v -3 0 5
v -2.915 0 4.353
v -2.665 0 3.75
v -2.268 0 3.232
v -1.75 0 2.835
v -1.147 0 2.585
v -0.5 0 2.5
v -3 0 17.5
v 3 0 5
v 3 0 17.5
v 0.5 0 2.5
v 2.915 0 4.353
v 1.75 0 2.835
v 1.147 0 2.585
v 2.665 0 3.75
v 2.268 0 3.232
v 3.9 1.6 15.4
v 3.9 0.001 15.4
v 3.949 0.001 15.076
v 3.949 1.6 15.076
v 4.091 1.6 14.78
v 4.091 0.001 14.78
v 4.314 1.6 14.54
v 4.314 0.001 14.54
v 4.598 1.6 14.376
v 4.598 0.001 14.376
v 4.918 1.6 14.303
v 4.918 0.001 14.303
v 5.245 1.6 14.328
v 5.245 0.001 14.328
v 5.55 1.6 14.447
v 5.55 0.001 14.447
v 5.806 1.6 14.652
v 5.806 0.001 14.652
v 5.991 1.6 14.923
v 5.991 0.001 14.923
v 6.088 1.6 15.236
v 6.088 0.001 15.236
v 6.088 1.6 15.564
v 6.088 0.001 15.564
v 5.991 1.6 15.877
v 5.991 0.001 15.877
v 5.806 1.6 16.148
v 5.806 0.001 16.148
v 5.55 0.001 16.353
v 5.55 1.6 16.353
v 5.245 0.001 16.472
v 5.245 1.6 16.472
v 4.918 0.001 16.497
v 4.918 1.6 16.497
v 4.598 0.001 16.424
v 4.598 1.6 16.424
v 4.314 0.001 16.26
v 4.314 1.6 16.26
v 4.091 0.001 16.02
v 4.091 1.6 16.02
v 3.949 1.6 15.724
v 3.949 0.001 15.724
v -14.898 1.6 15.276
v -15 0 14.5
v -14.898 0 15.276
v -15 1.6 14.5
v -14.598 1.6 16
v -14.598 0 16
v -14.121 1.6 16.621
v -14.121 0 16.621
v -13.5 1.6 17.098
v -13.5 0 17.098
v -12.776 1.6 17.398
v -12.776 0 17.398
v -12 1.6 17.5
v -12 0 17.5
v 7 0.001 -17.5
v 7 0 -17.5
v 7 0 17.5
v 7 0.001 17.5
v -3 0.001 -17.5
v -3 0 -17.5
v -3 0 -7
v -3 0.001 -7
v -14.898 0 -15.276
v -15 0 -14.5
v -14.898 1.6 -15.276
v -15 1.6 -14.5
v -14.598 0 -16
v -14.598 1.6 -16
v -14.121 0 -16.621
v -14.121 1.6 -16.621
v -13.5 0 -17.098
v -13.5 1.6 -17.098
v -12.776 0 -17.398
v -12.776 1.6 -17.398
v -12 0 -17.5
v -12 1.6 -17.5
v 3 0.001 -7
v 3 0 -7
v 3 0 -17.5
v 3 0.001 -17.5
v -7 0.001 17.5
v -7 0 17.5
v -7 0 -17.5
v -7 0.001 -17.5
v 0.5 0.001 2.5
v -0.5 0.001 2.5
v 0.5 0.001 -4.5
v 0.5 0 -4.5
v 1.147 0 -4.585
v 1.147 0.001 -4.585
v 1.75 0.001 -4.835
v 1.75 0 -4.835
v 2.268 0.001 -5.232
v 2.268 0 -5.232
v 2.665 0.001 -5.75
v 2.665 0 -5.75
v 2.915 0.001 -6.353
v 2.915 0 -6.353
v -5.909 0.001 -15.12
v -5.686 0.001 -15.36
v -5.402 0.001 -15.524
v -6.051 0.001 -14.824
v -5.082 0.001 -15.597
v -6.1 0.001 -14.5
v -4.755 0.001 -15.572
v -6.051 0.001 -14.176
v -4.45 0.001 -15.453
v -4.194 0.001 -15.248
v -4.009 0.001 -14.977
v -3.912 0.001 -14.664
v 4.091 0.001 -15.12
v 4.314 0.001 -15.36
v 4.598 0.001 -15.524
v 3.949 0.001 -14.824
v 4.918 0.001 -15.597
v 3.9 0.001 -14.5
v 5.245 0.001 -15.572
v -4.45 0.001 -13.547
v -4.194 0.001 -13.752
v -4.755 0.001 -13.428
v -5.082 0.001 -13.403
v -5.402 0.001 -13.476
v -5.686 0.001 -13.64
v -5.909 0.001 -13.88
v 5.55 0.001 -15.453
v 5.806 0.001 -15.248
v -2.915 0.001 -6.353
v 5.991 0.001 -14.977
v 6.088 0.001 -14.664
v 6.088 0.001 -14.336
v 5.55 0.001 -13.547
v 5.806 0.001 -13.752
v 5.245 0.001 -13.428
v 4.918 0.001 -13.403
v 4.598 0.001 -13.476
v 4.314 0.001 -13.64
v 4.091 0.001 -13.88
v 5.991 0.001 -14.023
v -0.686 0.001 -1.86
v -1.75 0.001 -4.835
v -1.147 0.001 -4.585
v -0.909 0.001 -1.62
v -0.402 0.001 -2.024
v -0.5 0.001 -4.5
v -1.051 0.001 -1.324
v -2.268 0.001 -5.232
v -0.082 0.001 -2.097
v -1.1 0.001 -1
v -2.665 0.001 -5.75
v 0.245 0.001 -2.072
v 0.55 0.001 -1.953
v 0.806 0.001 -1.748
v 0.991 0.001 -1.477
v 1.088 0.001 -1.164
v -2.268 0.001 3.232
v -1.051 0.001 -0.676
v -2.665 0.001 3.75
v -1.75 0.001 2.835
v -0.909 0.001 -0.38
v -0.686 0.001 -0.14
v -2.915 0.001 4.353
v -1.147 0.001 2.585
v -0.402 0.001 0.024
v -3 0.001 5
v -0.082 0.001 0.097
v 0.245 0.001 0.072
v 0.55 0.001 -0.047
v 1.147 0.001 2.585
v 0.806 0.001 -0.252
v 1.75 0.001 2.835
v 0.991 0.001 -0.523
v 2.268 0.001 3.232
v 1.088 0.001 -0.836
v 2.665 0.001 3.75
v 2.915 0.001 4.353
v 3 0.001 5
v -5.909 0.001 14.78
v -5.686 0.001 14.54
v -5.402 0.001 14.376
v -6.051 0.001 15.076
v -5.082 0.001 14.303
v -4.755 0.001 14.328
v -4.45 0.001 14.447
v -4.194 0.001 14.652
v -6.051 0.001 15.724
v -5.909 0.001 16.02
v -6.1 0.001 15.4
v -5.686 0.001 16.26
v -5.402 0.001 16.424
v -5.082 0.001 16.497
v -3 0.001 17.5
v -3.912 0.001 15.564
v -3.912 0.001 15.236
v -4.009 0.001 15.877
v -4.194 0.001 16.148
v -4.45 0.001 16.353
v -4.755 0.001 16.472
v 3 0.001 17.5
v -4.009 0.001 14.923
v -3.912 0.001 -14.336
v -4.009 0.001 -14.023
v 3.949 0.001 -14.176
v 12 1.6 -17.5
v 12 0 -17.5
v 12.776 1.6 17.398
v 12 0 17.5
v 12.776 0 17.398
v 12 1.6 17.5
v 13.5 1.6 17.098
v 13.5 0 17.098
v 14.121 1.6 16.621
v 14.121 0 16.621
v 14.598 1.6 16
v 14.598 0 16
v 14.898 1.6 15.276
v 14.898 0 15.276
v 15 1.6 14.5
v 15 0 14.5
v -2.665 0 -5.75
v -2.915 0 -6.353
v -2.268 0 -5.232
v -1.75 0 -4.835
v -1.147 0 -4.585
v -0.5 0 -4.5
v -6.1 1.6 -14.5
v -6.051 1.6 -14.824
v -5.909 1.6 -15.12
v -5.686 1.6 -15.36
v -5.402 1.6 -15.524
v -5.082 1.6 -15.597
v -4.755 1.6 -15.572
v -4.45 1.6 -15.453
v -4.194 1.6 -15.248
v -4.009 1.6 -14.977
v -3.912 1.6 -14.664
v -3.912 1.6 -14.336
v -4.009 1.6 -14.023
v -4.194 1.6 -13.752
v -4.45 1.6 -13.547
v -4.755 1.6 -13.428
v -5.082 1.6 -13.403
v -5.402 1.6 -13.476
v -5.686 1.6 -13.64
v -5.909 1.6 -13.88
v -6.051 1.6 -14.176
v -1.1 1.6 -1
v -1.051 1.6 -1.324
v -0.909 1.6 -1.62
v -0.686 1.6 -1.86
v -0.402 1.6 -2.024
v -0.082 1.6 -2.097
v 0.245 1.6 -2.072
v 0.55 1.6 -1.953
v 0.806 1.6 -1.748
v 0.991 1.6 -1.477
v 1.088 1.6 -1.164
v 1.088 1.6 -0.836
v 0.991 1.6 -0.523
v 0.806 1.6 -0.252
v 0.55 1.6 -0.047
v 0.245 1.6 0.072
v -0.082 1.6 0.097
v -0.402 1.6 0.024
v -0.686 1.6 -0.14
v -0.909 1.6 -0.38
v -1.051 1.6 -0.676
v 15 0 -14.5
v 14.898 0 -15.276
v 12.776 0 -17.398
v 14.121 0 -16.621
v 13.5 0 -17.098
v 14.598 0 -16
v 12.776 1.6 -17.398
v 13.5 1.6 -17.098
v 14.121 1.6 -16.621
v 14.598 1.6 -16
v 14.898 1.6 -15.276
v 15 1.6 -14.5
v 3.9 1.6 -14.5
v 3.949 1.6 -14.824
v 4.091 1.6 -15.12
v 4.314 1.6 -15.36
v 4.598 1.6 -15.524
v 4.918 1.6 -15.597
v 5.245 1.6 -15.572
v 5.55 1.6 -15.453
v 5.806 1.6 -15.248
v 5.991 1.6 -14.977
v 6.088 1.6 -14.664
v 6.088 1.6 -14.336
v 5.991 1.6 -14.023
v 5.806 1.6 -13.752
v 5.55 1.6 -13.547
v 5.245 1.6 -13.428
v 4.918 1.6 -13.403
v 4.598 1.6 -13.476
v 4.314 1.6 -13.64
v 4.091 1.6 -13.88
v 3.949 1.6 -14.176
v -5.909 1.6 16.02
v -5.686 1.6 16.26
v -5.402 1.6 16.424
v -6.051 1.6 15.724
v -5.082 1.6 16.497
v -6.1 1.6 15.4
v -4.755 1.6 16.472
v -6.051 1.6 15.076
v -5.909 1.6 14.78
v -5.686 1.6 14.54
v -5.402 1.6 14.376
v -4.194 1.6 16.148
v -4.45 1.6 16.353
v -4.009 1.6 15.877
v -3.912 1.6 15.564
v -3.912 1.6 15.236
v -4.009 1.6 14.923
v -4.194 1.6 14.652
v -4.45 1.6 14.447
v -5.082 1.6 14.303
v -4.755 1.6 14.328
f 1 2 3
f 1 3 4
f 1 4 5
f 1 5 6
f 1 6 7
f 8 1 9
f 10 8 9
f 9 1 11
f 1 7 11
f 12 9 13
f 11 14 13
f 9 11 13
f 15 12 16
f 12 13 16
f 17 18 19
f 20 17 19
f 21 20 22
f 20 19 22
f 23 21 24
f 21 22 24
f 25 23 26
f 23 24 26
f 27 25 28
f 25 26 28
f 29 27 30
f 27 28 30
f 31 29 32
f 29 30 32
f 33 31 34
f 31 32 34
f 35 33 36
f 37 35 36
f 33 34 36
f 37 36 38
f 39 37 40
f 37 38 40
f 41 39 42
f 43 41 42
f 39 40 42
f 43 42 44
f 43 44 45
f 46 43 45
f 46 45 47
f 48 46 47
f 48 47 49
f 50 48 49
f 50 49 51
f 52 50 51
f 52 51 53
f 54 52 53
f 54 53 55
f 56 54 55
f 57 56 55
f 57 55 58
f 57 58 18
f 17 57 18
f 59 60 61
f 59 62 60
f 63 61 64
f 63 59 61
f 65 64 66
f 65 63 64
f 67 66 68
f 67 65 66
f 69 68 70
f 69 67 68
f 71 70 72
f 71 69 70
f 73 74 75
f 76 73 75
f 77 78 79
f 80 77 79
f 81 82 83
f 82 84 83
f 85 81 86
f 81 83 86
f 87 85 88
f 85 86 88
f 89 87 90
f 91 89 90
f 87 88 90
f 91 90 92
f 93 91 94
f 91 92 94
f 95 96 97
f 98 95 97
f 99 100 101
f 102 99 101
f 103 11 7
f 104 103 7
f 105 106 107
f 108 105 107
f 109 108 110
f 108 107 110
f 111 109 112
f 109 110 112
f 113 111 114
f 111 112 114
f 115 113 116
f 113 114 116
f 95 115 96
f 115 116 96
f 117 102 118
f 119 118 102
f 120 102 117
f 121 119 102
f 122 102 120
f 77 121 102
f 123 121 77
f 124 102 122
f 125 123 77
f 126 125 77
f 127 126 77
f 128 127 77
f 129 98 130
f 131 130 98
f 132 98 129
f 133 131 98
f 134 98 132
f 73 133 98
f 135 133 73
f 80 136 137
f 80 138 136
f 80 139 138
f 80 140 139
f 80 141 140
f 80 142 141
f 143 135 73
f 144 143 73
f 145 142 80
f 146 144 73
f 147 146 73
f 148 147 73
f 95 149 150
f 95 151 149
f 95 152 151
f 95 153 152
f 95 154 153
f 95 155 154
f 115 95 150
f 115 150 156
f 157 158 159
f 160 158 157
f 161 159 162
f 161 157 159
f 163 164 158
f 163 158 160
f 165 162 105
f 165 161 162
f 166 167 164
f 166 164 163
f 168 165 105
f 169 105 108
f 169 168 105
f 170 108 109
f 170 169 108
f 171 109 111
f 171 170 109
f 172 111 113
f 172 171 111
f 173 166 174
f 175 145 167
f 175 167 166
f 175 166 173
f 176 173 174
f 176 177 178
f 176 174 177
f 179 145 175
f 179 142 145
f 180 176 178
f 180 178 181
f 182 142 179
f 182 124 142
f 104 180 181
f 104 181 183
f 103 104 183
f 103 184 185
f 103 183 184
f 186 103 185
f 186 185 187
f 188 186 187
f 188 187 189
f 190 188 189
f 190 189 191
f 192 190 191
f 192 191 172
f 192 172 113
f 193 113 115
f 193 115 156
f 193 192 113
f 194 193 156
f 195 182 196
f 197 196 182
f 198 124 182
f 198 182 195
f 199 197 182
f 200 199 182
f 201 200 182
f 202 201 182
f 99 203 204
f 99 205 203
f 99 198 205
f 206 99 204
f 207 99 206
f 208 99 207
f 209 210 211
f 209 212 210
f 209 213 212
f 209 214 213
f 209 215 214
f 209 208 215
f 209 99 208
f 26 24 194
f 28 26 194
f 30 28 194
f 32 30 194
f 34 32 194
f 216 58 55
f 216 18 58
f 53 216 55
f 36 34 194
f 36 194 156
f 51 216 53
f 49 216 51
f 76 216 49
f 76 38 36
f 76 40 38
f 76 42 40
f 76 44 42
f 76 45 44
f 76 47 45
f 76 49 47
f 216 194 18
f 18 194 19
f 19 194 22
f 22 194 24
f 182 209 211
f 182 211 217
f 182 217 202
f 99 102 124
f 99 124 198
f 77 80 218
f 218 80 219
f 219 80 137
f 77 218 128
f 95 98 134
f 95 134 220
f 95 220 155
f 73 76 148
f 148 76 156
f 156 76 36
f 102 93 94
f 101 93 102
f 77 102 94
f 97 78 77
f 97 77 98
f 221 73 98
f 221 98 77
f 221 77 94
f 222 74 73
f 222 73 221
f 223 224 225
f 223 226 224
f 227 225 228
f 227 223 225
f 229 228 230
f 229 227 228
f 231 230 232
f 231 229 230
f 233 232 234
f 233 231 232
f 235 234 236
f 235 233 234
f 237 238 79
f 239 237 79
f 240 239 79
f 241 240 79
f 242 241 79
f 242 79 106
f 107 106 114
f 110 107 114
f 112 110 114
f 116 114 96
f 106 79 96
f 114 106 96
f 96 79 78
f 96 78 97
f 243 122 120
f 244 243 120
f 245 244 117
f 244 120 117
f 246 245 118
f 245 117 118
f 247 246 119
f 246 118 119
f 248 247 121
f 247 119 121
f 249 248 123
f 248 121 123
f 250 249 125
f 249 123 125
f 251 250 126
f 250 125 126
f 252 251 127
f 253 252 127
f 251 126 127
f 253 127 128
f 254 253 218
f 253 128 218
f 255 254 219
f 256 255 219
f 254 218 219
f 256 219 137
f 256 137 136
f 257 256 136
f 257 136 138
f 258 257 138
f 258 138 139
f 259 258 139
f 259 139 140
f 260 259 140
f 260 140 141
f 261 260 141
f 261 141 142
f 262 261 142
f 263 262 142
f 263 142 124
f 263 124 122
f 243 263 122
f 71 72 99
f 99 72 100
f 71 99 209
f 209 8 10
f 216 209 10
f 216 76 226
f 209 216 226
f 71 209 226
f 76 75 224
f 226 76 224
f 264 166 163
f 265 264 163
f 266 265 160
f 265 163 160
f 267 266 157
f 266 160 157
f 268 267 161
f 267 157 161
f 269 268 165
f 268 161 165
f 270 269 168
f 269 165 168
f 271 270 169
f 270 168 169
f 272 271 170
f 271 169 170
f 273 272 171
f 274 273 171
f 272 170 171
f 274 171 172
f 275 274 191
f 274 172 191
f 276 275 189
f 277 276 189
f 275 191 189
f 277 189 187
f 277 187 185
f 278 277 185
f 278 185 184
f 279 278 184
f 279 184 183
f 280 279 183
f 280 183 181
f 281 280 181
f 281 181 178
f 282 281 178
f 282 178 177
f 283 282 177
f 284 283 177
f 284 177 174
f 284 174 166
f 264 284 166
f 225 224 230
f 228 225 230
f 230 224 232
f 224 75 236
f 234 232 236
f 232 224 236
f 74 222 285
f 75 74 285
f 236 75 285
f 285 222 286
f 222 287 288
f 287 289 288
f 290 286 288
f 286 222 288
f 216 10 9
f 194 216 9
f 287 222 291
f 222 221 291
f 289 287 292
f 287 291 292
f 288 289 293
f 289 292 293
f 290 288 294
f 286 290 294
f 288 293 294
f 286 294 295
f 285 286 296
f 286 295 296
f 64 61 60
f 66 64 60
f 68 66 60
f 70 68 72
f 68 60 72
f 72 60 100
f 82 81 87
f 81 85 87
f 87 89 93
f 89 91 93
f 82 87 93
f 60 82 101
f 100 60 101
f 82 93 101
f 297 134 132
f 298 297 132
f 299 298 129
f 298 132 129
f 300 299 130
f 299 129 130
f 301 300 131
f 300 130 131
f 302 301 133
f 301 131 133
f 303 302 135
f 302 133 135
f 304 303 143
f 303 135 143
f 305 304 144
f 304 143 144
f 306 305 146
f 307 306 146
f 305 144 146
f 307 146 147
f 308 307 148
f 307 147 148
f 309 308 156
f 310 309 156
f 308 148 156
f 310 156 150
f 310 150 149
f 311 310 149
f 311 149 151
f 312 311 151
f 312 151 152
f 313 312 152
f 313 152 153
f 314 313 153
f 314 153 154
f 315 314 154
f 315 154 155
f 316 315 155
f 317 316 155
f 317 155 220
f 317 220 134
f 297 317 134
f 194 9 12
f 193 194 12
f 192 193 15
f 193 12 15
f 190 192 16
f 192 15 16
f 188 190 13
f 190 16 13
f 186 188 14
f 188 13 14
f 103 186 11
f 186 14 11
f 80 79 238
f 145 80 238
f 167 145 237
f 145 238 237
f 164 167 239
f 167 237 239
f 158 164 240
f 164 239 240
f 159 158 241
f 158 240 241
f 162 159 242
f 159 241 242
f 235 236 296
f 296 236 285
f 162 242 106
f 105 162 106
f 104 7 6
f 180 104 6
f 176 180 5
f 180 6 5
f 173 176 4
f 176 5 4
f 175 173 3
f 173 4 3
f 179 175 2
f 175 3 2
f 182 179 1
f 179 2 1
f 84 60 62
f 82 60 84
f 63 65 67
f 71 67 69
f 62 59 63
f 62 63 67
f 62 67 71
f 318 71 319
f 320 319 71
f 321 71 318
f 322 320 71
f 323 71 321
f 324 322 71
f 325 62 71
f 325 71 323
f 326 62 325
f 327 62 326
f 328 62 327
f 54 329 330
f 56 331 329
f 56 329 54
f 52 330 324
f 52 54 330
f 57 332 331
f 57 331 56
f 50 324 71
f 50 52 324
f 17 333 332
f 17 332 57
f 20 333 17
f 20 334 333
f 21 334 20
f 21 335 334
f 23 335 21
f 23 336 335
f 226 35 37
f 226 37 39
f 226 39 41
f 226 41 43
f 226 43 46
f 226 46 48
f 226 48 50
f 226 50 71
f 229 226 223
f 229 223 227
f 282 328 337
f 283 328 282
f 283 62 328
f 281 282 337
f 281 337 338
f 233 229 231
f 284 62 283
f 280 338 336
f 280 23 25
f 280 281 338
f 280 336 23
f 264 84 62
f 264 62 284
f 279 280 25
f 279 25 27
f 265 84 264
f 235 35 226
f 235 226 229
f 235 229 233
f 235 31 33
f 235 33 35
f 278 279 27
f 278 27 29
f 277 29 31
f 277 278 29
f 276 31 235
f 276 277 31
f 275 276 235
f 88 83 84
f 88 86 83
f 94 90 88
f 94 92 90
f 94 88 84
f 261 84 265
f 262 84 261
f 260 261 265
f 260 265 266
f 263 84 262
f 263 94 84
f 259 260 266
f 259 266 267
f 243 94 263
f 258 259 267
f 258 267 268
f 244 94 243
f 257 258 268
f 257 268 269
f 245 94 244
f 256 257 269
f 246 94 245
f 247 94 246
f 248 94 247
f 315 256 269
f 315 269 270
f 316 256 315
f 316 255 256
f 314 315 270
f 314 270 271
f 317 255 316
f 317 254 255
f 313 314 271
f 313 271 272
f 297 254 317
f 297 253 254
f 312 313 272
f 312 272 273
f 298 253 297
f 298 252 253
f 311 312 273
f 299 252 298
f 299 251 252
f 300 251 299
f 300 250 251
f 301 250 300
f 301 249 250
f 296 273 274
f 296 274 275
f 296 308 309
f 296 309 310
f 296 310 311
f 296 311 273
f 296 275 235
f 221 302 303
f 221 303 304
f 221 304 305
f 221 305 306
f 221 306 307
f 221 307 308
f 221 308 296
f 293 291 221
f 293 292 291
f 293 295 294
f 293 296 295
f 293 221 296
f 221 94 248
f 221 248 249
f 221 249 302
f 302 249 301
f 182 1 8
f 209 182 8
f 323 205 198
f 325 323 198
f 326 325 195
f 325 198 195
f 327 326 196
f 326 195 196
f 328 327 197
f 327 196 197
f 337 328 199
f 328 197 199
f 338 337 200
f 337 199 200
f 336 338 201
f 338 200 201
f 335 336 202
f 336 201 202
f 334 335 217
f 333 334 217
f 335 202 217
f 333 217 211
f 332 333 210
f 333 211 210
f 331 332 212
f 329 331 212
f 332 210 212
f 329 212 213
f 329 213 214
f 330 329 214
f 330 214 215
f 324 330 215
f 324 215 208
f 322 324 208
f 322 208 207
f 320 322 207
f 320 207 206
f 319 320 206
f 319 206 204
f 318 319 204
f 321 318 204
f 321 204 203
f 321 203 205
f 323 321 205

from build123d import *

# Parameters (mm, degrees)
SKETCH1_W                = 30
SKETCH1_H                = 35
BOSS_EXTRUDE1_DEPTH      = 1.6
CUT_EXTRUDE3_DEPTH       = 0.001
M2_CLEARANCE_HOLE1_D     = 2.2
M2_CLEARANCE_HOLE1_DEPTH = 5.2
M2_CLEARANCE_HOLE1_TIP   = 0.660946681
FILLET2_R                = 3


with BuildPart() as part:
    # Sketch1 → Boss-Extrude1 (new body)
    with BuildSketch(Plane(origin=(0, 0, 0), x_dir=(1, 0, 0), z_dir=(0, 1, 0))):
        Rectangle(SKETCH1_W, SKETCH1_H)
    extrude(amount=BOSS_EXTRUDE1_DEPTH)

    # Sketch5 → Cut-Extrude3 (cut)
    with BuildSketch(Plane.XZ):
        with BuildLine():
            Line((7, 17.5), (3, 17.5))
            Line((3, 17.5), (3, 5))
            ThreePointArc((3, 5), (2.267766953, 3.232233047), (0.5, 2.5))
            Line((0.5, 2.5), (-0.5, 2.5))
            ThreePointArc((-0.5, 2.5), (-2.267766953, 3.232233047), (-3, 5))
            Line((-3, 5), (-3, 17.5))
            Line((-3, 17.5), (-7, 17.5))
            Line((-7, 17.5), (-7, -17.5))
            Line((-7, -17.5), (-3, -17.5))
            Line((-3, -17.5), (-3, -7))
            ThreePointArc((-3, -7), (-2.267766953, -5.232233047), (-0.5, -4.5))
            Line((-0.5, -4.5), (0.5, -4.5))
            ThreePointArc((0.5, -4.5), (2.267766953, -5.232233047), (3, -7))
            Line((3, -7), (3, -17.5))
            Line((3, -17.5), (7, -17.5))
            Line((7, -17.5), (7, 17.5))
        make_face()
    extrude(amount=-CUT_EXTRUDE3_DEPTH, mode=Mode.SUBTRACT)

    # M2 Clearance Hole1
    with Locations(Plane(origin=(0, 1.6, 0), x_dir=(1, 0, 0), z_dir=(0, 1, 0))):
        with Locations((-5, 14.5), (-5, -15.4), (5, -15.4), (5, 14.5), (0, 1)):
            Hole(M2_CLEARANCE_HOLE1_D / 2, depth=M2_CLEARANCE_HOLE1_DEPTH)
            with Locations((0, 0, -(M2_CLEARANCE_HOLE1_DEPTH + M2_CLEARANCE_HOLE1_TIP / 2))):  # 118° drill point
                Cone(0, M2_CLEARANCE_HOLE1_D / 2, M2_CLEARANCE_HOLE1_TIP, mode=Mode.SUBTRACT)

    # Fillet2
    fillet2_edges = [part.edges().sort_by_distance(p)[0] for p in [
        (-15, 0.8, -17.5),
        (15, 0.8, -17.5),
        (15, 0.8, 17.5),
        (-15, 0.8, 17.5),
    ]]
    fillet(fillet2_edges, radius=FILLET2_R)


solid = part.part
